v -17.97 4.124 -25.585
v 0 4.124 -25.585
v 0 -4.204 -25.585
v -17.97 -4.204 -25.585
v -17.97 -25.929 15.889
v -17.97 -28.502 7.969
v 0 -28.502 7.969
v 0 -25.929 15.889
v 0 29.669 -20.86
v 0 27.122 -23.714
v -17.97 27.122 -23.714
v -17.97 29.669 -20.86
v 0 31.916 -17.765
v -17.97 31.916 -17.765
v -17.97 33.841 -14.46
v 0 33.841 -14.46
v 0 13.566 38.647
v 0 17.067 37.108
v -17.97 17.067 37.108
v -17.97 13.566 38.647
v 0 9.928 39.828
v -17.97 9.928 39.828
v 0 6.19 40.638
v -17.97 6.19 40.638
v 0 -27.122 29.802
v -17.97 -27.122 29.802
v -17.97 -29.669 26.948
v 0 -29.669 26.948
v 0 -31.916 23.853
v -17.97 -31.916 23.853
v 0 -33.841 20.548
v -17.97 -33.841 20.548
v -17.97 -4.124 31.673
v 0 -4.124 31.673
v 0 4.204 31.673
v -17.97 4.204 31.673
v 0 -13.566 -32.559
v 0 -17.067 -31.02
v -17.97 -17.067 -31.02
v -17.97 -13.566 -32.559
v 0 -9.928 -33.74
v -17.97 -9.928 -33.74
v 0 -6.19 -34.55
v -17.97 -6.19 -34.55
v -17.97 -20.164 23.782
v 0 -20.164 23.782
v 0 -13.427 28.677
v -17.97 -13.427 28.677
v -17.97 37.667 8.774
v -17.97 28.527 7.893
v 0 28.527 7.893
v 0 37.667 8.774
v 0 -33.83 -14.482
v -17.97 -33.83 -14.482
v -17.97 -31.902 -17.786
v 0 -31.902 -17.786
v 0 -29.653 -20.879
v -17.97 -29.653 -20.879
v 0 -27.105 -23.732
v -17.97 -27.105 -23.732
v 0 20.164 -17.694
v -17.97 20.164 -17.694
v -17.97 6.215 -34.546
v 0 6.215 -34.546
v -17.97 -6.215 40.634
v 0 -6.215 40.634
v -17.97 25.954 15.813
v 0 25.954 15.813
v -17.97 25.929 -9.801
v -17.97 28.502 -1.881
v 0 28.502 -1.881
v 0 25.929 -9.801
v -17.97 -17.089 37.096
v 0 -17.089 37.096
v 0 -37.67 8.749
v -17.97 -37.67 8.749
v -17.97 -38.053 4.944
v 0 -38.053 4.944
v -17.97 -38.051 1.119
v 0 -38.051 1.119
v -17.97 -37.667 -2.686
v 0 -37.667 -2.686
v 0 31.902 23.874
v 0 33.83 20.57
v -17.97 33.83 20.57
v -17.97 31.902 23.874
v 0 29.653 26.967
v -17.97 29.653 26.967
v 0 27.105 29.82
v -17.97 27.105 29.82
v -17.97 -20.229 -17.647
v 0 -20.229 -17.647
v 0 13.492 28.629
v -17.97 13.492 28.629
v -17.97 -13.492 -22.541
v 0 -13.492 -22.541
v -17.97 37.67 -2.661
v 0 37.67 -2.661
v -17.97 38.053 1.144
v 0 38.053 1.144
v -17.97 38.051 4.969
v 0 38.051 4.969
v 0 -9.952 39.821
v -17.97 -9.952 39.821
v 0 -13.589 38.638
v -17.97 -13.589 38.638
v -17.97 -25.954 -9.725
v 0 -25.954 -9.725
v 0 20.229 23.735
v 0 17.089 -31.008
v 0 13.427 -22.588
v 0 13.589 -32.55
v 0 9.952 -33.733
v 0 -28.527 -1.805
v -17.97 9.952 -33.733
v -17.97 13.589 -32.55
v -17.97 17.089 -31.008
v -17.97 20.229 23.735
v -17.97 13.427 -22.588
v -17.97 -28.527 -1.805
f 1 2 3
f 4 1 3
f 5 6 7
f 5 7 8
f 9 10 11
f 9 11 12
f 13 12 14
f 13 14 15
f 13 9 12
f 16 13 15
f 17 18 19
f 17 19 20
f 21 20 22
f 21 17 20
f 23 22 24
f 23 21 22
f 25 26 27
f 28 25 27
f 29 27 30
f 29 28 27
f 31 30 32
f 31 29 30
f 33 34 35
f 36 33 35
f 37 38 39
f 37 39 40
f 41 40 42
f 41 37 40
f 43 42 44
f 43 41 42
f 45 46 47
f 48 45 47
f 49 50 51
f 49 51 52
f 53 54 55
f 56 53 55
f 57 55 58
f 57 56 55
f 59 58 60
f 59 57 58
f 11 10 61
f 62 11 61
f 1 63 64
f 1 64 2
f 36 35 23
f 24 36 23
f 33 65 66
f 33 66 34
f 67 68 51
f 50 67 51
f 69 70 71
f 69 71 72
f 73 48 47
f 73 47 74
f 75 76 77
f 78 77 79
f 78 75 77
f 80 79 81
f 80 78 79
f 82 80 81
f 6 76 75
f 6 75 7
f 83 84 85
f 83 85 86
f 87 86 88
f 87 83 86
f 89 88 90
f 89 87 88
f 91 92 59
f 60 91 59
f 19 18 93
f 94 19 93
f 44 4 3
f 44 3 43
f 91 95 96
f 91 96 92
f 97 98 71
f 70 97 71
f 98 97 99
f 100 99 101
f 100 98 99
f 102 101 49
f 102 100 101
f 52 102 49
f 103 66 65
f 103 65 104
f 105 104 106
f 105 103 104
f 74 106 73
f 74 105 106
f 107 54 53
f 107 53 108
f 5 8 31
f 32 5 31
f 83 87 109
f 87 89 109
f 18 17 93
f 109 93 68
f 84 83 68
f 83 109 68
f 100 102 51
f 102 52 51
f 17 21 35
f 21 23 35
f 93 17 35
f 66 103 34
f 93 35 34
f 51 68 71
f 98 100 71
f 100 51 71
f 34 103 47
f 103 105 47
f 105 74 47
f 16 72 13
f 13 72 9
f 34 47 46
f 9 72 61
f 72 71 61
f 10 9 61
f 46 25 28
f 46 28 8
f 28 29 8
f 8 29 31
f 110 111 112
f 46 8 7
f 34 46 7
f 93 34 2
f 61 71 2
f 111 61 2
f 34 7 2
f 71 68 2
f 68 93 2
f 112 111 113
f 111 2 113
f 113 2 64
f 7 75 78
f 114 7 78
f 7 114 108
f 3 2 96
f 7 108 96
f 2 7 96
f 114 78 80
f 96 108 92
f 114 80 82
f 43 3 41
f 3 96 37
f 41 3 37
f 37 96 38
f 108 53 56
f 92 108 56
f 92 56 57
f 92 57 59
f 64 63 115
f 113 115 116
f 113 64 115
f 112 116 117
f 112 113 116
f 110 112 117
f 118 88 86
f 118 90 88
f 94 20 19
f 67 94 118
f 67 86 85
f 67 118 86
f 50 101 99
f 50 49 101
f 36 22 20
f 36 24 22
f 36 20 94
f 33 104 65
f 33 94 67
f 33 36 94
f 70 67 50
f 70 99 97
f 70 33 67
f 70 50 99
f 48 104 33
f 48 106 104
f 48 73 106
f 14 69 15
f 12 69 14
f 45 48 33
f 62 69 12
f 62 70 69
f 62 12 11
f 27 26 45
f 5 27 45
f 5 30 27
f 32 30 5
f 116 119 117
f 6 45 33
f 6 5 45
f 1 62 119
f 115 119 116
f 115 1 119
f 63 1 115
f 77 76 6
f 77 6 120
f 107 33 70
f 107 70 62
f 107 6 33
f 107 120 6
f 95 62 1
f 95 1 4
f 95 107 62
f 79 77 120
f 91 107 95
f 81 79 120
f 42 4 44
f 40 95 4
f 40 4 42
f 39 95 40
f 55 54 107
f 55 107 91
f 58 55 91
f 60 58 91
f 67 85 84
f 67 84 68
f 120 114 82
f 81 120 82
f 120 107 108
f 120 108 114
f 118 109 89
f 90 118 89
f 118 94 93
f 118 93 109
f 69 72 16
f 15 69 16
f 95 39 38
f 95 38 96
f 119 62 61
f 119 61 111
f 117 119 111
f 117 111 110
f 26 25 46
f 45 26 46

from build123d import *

# Parameters (mm, degrees)
F0_W            = 17.96984524
F0_H            = 38.1
F3_DEPTH        = 25.4
F3_COPIES_COUNT = 10


# Not quite as in the source:
# - a pattern or mirror of a feature is missing from the dataset's text; its kind, count and spacing are read off the source's solid


with BuildPart() as f1:
    # F0 (on Front) → F1 (revolve)
    with BuildSketch(Plane.XZ):
        with Locations((-8.98492262, 22.0940720202)):
            Rectangle(F0_W, F0_H)
    revolve(axis=Axis((-8.98492262, 0, 3.0440720202), (1, 0, 0)))

    # F2 (on face) → F3 (cut)
    with BuildSketch(Plane.YZ):
        with BuildLine():
            Line((-6.214665944, 40.6338036926), (-4.1235210374, 31.6734537482))
            Line((-4.1235210374, 31.6734537482), (0, 31.6734537482))
            Line((0, 31.6734537482), (0, 41.1440720202))
            ThreePointArc((0, 41.1440720202), (-3.117789544, 41.0162906591), (-6.214665944, 40.6338036926))
        make_face()
        with BuildLine():
            Line((0, 41.1440720202), (0, 31.6734537482))
            Line((0, 31.6734537482), (4.2036371306, 31.6734537482))
            Line((4.2036371306, 31.6734537482), (6.1898369976, 40.6379002098))
            ThreePointArc((6.1898369976, 40.6379002098), (3.1052492637, 41.0173182208), (0, 41.1440720202))
        make_face()
    f3 = extrude(amount=-F3_DEPTH, mode=Mode.SUBTRACT)

    # F3_copies: F3 ×10 about axis
    f3_copies_axis = Axis((0, 0, 3.044072), (1, 0, 0))
    for i in range(1, F3_COPIES_COUNT):
        add(f3.rotate(f3_copies_axis, i * 360 / F3_COPIES_COUNT), mode=Mode.SUBTRACT)


solid = f1.part
